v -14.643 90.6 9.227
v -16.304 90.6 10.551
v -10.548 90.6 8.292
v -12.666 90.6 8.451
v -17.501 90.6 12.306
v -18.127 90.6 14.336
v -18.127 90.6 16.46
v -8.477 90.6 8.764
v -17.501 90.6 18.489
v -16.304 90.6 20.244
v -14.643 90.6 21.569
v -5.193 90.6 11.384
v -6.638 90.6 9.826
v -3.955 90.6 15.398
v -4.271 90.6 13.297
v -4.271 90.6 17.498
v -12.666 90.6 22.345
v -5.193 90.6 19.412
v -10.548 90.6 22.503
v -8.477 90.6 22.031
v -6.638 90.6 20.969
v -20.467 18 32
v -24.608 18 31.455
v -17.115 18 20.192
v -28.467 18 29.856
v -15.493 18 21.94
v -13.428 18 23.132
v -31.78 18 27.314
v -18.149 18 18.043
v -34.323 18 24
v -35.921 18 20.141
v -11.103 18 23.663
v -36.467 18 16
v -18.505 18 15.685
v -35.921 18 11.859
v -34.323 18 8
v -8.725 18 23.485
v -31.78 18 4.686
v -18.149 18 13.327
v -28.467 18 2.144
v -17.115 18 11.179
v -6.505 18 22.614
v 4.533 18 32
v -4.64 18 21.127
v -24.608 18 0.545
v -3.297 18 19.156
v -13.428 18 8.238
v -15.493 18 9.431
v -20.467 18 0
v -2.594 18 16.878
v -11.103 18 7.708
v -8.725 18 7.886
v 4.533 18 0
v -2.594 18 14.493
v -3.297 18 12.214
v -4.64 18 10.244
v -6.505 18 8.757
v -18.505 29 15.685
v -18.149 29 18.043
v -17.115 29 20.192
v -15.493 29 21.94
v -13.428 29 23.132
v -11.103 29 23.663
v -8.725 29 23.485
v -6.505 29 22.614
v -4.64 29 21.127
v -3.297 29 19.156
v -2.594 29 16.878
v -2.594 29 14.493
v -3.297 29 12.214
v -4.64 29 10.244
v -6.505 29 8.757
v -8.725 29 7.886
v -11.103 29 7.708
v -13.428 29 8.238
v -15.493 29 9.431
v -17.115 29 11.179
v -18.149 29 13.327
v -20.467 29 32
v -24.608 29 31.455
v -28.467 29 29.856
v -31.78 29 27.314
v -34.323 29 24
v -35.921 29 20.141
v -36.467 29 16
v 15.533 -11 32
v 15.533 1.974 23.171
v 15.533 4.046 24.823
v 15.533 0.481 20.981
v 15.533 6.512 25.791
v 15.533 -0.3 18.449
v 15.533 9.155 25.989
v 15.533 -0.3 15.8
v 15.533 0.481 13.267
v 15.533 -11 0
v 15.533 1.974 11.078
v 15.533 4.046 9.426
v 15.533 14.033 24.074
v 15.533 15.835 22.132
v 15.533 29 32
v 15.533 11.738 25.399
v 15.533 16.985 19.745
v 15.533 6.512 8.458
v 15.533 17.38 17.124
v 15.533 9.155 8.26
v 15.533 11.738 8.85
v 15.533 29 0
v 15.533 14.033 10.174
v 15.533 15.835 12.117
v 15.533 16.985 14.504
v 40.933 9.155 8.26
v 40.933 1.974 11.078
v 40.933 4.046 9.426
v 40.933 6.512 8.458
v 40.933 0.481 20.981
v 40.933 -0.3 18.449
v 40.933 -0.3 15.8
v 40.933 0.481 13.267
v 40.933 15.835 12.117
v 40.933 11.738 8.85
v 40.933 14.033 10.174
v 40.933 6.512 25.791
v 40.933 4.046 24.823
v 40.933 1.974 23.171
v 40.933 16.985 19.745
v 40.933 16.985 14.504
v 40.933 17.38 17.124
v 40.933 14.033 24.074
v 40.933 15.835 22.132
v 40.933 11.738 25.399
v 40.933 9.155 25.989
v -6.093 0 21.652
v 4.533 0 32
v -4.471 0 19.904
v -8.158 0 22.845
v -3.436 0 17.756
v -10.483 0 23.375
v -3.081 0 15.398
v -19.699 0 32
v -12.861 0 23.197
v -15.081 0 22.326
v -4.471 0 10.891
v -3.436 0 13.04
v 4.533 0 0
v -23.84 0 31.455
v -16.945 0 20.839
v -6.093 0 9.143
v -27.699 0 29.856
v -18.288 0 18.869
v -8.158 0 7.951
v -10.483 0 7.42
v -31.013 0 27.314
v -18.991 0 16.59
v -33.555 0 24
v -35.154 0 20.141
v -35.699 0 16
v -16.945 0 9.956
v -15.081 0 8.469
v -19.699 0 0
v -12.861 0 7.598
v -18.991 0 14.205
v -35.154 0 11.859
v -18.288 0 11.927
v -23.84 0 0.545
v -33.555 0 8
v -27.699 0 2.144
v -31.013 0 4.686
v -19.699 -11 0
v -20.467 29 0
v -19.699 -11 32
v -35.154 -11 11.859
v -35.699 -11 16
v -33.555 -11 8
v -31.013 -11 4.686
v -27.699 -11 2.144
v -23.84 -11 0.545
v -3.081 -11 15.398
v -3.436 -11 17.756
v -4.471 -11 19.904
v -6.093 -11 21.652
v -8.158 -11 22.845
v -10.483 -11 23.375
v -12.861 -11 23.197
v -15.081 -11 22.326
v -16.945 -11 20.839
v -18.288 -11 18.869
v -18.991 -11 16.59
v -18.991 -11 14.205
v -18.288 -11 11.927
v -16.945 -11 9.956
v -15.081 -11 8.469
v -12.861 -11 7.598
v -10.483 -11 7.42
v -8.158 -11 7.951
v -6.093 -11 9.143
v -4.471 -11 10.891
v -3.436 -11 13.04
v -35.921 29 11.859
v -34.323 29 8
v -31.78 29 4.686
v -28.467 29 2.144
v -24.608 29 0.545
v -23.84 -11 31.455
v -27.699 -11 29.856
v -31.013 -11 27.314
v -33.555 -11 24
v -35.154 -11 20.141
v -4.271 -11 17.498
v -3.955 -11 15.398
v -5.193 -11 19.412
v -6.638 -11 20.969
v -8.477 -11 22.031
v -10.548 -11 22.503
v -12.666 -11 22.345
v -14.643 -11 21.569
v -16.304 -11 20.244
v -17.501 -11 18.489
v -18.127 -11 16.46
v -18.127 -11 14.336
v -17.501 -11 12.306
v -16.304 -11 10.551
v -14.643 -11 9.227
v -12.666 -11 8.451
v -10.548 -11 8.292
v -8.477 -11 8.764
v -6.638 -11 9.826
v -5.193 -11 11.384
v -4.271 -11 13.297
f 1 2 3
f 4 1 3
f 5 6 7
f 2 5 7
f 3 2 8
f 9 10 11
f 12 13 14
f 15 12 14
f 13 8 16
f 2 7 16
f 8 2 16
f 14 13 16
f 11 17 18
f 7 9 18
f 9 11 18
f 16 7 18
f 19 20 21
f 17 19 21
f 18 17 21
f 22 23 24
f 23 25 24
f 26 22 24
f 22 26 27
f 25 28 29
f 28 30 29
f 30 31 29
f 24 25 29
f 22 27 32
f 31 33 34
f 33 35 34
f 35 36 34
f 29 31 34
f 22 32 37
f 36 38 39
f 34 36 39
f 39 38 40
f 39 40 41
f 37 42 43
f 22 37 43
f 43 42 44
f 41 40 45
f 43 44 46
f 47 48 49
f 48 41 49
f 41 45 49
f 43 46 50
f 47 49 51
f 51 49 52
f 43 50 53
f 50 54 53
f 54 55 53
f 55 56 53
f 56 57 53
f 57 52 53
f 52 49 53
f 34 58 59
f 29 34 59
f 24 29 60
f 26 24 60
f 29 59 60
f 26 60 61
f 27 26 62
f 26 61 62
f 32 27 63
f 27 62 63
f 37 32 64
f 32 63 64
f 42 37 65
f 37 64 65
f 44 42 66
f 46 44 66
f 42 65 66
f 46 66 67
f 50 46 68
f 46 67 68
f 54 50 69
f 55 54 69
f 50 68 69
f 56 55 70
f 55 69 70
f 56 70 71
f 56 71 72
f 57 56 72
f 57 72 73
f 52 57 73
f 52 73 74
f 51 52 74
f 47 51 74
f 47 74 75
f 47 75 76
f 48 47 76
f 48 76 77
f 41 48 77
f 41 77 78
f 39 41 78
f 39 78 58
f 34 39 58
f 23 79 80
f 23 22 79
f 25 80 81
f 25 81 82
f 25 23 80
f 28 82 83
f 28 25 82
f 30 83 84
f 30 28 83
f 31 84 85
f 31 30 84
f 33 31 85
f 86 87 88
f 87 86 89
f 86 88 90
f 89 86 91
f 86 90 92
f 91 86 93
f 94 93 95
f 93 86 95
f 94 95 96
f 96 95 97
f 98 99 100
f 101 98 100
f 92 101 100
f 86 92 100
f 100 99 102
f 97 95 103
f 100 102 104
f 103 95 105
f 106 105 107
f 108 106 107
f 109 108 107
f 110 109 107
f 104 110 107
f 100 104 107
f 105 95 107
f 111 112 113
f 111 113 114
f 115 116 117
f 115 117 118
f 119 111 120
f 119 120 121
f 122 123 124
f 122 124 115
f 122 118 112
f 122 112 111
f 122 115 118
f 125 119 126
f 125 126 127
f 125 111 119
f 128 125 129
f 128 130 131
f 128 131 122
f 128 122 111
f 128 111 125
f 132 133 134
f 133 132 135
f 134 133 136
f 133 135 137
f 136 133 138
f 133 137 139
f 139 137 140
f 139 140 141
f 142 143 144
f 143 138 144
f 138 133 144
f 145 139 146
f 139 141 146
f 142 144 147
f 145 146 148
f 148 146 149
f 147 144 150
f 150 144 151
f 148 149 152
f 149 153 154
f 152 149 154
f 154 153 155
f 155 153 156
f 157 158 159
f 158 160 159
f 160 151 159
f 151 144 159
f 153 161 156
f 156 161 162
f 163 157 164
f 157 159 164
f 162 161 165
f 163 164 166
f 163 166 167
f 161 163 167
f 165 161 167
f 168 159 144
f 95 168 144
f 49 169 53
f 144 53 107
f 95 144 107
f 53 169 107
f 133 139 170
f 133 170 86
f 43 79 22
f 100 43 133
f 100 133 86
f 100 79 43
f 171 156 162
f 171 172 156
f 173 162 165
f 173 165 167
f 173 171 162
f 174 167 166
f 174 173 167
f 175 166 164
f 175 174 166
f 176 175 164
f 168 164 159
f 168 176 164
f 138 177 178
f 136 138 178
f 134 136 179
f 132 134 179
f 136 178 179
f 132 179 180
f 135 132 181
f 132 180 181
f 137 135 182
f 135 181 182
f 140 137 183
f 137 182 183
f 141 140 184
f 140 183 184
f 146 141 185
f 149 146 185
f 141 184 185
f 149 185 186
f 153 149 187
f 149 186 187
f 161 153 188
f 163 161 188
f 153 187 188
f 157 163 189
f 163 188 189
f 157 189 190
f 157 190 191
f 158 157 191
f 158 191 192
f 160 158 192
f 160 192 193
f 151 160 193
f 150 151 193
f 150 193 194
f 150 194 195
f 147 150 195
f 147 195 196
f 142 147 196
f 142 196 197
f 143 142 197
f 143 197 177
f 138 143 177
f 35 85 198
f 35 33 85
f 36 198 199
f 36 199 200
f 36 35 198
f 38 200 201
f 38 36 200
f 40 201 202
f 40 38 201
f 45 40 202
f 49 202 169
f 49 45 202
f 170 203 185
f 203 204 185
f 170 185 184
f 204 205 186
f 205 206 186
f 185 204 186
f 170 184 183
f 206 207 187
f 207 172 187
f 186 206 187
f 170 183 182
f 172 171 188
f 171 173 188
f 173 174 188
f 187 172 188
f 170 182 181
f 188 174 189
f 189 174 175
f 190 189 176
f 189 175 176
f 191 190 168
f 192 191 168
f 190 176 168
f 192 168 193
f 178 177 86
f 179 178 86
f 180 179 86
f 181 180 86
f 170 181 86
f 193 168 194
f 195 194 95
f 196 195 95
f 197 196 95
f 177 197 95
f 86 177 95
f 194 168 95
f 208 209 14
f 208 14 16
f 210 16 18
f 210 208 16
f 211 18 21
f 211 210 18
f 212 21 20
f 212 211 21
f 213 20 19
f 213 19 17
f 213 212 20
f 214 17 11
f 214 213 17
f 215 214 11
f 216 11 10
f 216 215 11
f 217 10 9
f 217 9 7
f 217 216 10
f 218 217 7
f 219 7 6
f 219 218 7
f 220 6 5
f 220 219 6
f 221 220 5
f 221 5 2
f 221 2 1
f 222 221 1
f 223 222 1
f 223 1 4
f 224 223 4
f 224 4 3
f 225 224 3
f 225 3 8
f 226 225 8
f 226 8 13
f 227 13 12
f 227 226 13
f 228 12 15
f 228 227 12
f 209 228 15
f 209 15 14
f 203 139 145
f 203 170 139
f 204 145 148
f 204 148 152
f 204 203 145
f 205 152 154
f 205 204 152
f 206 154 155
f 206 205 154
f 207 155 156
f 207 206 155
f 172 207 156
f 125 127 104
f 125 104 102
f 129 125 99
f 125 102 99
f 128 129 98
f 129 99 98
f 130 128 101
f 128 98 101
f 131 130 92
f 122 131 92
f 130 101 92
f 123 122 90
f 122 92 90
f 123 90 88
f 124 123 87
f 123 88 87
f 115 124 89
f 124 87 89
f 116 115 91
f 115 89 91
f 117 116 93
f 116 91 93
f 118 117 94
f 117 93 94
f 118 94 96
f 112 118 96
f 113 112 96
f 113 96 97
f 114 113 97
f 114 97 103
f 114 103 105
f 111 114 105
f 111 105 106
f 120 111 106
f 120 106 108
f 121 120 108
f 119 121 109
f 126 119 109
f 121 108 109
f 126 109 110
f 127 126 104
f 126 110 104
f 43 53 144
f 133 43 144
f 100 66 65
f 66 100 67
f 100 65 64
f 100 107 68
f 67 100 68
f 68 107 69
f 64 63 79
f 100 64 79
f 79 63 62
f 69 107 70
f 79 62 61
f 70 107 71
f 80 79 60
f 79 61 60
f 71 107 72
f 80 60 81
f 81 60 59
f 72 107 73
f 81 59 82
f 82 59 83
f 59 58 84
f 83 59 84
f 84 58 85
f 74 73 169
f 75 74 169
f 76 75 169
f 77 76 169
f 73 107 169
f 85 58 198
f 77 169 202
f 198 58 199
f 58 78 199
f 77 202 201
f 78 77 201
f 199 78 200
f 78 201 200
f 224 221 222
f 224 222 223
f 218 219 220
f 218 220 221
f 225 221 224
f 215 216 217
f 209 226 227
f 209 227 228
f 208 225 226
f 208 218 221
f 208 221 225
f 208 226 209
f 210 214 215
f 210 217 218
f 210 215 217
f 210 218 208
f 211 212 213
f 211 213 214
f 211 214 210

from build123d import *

# Parameters (mm, degrees)
F1_DEPTH  = 32
F2_R      = 8
F3_DEPTH  = 25.4
F4_R      = 8
F5_DEPTH  = 25.4
F6_R      = 16
F7_R      = 15.99999
F8_R      = 16
F9_R      = 15.99999
F10_R     = 8.8894259747
F11_DEPTH = 25.4
F12_R     = 7.125734637
F13_DEPTH = 101.6


# Not quite as in the source:
# - a fillet or chamfer is up to 0.001 mm smaller than in the source, because OpenCascade refuses the exact size


with BuildPart() as f1:
    # F0 (on Top) → F1 (new body)
    with BuildSketch(Plane.XY):
        Polygon((15.5333588993, 29), (-36.4666411007, 29), (-36.4666411007, 18), (4.5333588993, 18), (4.5333588993, 0), (-35.6989217131, 0), (-35.6989217131, -11), (15.5333588993, -11), align=None)
    extrude(amount=F1_DEPTH)

    # F2 (on face) → F3 (cut)
    with BuildSketch(Plane.XZ.offset(11)):
        with Locations((-11.0805211589, 15.3976073489)):
            Circle(F2_R)
    extrude(amount=-F3_DEPTH, mode=Mode.SUBTRACT)

    # F4 (on face) → F5 (cut)
    with BuildSketch(Plane(origin=(0, 29, 0), x_dir=(-1, 0, 0), z_dir=(0, 1, 0))):
        with Locations((10.5049097911, 15.6854130328)):
            Circle(F4_R)
    extrude(amount=-F5_DEPTH, mode=Mode.SUBTRACT)

    # F6
    f6_edges = [f1.edges().sort_by_distance(p)[0] for p in [
        (-35.698922, -5.5, 32),
    ]]
    fillet(f6_edges, radius=F6_R)

    # F7 (radius 16 in the source; OpenCascade refuses exactly that, so slightly less here)
    f7_edges = [f1.edges().sort_by_distance(p)[0] for p in [
        (-35.698922, -5.5, 0),
    ]]
    fillet(f7_edges, radius=F7_R)

    # F8
    f8_edges = [f1.edges().sort_by_distance(p)[0] for p in [
        (-36.466641, 23.5, 32),
    ]]
    fillet(f8_edges, radius=F8_R)

    # F9 (radius 16 in the source; OpenCascade refuses exactly that, so slightly less here)
    f9_edges = [f1.edges().sort_by_distance(p)[0] for p in [
        (-36.466641, 23.5, 0),
    ]]
    fillet(f9_edges, radius=F9_R)

    # F10 (on face) → F11 (join)
    with BuildSketch(Plane.YZ.offset(15.5333588993)):
        with Locations((8.4902700037, 17.1244423836)):
            Circle(F10_R)
    extrude(amount=F11_DEPTH)


with BuildPart() as f13:
    # F12 (on face) → F13 (new body)
    with BuildSketch(Plane.XZ.offset(11)):
        with Locations((-11.0805211589, 15.3976073489)):
            Circle(F12_R)
    extrude(amount=-F13_DEPTH)


solid = Compound([f1.part, f13.part])
